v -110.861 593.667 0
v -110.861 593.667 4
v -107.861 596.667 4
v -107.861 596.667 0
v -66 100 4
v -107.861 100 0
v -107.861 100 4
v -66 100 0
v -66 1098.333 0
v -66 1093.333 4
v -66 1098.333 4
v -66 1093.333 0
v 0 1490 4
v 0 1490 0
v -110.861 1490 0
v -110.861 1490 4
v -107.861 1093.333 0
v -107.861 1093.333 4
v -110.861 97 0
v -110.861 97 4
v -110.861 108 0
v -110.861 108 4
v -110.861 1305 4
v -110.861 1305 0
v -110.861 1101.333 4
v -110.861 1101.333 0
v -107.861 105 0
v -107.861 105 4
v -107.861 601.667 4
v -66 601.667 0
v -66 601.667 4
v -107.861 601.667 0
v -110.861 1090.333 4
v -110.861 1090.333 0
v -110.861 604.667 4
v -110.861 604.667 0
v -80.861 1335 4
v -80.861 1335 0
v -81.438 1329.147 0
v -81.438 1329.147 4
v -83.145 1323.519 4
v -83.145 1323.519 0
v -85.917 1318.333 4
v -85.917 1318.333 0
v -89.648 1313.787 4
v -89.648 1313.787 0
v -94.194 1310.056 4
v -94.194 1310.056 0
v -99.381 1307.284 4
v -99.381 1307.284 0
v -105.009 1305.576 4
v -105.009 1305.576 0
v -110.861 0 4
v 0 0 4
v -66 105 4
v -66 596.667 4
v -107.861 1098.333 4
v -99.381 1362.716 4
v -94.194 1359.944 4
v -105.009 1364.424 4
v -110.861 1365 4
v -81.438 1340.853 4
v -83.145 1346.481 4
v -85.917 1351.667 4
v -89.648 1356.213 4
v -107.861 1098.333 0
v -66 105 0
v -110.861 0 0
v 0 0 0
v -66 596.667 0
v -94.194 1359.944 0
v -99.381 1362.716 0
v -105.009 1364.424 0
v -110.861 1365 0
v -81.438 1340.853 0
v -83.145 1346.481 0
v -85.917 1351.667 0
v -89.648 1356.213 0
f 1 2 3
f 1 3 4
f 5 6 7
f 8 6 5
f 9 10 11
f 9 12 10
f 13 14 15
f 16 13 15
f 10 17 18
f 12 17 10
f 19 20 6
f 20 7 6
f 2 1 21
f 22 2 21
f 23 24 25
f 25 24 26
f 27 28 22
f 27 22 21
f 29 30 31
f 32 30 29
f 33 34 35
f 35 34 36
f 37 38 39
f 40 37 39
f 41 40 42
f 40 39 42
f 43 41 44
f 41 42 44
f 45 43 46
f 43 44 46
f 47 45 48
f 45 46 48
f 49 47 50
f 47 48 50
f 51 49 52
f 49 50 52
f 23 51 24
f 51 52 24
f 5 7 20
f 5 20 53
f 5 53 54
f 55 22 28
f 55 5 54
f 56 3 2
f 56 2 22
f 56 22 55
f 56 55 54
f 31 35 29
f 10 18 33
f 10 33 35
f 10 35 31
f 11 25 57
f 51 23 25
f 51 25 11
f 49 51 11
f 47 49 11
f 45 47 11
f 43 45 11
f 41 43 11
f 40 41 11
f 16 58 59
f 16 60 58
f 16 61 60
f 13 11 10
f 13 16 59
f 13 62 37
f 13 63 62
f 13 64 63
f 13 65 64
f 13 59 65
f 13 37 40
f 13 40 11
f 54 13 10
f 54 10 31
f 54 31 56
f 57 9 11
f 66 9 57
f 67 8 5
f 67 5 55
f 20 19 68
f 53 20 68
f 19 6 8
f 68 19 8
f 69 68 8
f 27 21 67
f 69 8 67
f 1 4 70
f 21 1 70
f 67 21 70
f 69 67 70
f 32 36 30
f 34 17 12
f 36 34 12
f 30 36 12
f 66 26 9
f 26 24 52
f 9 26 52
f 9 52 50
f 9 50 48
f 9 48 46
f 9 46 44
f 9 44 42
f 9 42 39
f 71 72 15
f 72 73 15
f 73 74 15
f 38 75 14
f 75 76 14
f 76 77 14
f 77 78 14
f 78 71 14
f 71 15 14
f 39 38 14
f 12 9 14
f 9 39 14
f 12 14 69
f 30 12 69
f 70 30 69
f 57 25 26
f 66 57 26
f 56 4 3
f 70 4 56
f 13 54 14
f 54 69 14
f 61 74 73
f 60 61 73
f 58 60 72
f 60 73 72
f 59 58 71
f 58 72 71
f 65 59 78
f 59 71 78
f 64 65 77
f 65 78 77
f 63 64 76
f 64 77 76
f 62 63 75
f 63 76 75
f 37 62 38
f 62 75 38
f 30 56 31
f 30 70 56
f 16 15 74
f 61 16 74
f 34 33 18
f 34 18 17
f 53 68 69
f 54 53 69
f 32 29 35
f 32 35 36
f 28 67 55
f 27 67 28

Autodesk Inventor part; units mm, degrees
ref_plane "YZ Plane" through (0, 0, 0) normal (1, 0, 0) x (0, 1, 0)
ref_plane "XZ Plane" through (0, 0, 0) normal (0, 1, 0) x (-1, 0, 0)
ref_plane "XY Plane" through (0, 0, 0) normal (0, 0, 1) x (1, 0, 0)
sketch "Sketch1" plane through (0, 0, 0) normal (0, 0, 1) x (1, 0, 0)
  line L0 (0, 1490) -> (-110.8614, 1490)
  line L1 (-110.8614, 1490) -> (-110.8614, 0)
  line L2 (-110.8614, 0) -> (0, 0)
  line L3 (0, 0) -> (0, 1490)
  line L4 (-110.8614, 100) -> (-66, 100)
  line L5 (-66, 100) -> (-66, 105)
  line L6 (-66, 105) -> (-110.8614, 105)
  line L7 (-110.8614, 105) -> (-110.8614, 100)
  line L8 (-110.8614, 596.6667) -> (-66, 596.6667)
  line L9 (-66, 596.6667) -> (-66, 601.6667)
  line L10 (-66, 601.6667) -> (-110.8614, 601.6667)
  line L11 (-110.8614, 601.6667) -> (-110.8614, 596.6667)
  line L12 (-110.8614, 1093.3333) -> (-66, 1093.3333)
  line L13 (-66, 1093.3333) -> (-66, 1098.3333)
  line L14 (-66, 1098.3333) -> (-110.8614, 1098.3333)
  line L15 (-110.8614, 1098.3333) -> (-110.8614, 1093.3333)
  circle A0 centre (-110.8614, 1335) radius 30
  point P0 (-110.8614, 1098.3333)
  point P1 (-110.8614, 1093.3333)
  point P2 (-110.8614, 601.6667)
  point P3 (-110.8614, 596.6667)
  point P4 (-110.8614, 105)
  point P5 (-110.8614, 1365)
  point P6 (-110.8614, 1305)
  dimension "d0" = 1490
  dimension "d1" = 110.8614
  dimension "d2" = 5
  dimension "d4" = 100
  dimension "d7" = 496.6667
  dimension "d23" = 66
  dimension "d29" = 60
  dimension "d30" = 1335
extrude "Plate1" add sketch "Sketch1" along normal blind 4 contours L3 L2 L1 L4 L5 L6 L8 L9 L10 L12 L13 L14 A0 L0
chamfer "Corner Chamfer1" distance 3 angle 45 6 edges at (-110.8614, 100, 2) (-110.8614, 105, 2) (-110.8614, 596.6667, 2) (-110.8614, 601.6667, 2) (-110.8614, 1098.3333, 2) (-110.8614, 1093.3333, 2)
equation "\"d0\" = Стрингер_длина"
equation "\"d1\" = стрингер_глубина_8"
equation "\"d2\" = паз_под_стрингер_толщина"
equation "\"d7\" = Шаг_шпангоутов"
equation "\"d23\" = паз_под_стрингер_глубина - Thickness"
equation "\"d29\" = 2 * радиус_выреза_под_сварку"
equation "\"d12\" = Thickness"
equation "\"BendRadius\" = Thickness"
equation "\"BendReliefWidth\" = Thickness"
equation "\"BendReliefDepth\" = 0.5 * Thickness"
equation "\"CornerReliefSize\" = 4 * Thickness"
equation "\"MinimumRemnant\" = 2 * Thickness"
equation "\"TransitionRadius\" = BendRadius"
equation "\"JacobiRadiusSize\" = BendRadius"
equation "\"GapSize\" = Thickness"
equation "\"Стрингер_длина\" = 1490"
equation "\"стрингер_глубина_8\" = 110.861434"
equation "\"паз_под_стрингер_толщина\" = 5"
equation "\"Шаг_шпангоутов\" = 496.666667"
equation "\"паз_под_стрингер_глубина\" = 70"
equation "\"Thickness\" = 4"
equation "\"радиус_выреза_под_сварку\" = 30"
properties part number "01014 GBK stringer C8" material "Steel"
